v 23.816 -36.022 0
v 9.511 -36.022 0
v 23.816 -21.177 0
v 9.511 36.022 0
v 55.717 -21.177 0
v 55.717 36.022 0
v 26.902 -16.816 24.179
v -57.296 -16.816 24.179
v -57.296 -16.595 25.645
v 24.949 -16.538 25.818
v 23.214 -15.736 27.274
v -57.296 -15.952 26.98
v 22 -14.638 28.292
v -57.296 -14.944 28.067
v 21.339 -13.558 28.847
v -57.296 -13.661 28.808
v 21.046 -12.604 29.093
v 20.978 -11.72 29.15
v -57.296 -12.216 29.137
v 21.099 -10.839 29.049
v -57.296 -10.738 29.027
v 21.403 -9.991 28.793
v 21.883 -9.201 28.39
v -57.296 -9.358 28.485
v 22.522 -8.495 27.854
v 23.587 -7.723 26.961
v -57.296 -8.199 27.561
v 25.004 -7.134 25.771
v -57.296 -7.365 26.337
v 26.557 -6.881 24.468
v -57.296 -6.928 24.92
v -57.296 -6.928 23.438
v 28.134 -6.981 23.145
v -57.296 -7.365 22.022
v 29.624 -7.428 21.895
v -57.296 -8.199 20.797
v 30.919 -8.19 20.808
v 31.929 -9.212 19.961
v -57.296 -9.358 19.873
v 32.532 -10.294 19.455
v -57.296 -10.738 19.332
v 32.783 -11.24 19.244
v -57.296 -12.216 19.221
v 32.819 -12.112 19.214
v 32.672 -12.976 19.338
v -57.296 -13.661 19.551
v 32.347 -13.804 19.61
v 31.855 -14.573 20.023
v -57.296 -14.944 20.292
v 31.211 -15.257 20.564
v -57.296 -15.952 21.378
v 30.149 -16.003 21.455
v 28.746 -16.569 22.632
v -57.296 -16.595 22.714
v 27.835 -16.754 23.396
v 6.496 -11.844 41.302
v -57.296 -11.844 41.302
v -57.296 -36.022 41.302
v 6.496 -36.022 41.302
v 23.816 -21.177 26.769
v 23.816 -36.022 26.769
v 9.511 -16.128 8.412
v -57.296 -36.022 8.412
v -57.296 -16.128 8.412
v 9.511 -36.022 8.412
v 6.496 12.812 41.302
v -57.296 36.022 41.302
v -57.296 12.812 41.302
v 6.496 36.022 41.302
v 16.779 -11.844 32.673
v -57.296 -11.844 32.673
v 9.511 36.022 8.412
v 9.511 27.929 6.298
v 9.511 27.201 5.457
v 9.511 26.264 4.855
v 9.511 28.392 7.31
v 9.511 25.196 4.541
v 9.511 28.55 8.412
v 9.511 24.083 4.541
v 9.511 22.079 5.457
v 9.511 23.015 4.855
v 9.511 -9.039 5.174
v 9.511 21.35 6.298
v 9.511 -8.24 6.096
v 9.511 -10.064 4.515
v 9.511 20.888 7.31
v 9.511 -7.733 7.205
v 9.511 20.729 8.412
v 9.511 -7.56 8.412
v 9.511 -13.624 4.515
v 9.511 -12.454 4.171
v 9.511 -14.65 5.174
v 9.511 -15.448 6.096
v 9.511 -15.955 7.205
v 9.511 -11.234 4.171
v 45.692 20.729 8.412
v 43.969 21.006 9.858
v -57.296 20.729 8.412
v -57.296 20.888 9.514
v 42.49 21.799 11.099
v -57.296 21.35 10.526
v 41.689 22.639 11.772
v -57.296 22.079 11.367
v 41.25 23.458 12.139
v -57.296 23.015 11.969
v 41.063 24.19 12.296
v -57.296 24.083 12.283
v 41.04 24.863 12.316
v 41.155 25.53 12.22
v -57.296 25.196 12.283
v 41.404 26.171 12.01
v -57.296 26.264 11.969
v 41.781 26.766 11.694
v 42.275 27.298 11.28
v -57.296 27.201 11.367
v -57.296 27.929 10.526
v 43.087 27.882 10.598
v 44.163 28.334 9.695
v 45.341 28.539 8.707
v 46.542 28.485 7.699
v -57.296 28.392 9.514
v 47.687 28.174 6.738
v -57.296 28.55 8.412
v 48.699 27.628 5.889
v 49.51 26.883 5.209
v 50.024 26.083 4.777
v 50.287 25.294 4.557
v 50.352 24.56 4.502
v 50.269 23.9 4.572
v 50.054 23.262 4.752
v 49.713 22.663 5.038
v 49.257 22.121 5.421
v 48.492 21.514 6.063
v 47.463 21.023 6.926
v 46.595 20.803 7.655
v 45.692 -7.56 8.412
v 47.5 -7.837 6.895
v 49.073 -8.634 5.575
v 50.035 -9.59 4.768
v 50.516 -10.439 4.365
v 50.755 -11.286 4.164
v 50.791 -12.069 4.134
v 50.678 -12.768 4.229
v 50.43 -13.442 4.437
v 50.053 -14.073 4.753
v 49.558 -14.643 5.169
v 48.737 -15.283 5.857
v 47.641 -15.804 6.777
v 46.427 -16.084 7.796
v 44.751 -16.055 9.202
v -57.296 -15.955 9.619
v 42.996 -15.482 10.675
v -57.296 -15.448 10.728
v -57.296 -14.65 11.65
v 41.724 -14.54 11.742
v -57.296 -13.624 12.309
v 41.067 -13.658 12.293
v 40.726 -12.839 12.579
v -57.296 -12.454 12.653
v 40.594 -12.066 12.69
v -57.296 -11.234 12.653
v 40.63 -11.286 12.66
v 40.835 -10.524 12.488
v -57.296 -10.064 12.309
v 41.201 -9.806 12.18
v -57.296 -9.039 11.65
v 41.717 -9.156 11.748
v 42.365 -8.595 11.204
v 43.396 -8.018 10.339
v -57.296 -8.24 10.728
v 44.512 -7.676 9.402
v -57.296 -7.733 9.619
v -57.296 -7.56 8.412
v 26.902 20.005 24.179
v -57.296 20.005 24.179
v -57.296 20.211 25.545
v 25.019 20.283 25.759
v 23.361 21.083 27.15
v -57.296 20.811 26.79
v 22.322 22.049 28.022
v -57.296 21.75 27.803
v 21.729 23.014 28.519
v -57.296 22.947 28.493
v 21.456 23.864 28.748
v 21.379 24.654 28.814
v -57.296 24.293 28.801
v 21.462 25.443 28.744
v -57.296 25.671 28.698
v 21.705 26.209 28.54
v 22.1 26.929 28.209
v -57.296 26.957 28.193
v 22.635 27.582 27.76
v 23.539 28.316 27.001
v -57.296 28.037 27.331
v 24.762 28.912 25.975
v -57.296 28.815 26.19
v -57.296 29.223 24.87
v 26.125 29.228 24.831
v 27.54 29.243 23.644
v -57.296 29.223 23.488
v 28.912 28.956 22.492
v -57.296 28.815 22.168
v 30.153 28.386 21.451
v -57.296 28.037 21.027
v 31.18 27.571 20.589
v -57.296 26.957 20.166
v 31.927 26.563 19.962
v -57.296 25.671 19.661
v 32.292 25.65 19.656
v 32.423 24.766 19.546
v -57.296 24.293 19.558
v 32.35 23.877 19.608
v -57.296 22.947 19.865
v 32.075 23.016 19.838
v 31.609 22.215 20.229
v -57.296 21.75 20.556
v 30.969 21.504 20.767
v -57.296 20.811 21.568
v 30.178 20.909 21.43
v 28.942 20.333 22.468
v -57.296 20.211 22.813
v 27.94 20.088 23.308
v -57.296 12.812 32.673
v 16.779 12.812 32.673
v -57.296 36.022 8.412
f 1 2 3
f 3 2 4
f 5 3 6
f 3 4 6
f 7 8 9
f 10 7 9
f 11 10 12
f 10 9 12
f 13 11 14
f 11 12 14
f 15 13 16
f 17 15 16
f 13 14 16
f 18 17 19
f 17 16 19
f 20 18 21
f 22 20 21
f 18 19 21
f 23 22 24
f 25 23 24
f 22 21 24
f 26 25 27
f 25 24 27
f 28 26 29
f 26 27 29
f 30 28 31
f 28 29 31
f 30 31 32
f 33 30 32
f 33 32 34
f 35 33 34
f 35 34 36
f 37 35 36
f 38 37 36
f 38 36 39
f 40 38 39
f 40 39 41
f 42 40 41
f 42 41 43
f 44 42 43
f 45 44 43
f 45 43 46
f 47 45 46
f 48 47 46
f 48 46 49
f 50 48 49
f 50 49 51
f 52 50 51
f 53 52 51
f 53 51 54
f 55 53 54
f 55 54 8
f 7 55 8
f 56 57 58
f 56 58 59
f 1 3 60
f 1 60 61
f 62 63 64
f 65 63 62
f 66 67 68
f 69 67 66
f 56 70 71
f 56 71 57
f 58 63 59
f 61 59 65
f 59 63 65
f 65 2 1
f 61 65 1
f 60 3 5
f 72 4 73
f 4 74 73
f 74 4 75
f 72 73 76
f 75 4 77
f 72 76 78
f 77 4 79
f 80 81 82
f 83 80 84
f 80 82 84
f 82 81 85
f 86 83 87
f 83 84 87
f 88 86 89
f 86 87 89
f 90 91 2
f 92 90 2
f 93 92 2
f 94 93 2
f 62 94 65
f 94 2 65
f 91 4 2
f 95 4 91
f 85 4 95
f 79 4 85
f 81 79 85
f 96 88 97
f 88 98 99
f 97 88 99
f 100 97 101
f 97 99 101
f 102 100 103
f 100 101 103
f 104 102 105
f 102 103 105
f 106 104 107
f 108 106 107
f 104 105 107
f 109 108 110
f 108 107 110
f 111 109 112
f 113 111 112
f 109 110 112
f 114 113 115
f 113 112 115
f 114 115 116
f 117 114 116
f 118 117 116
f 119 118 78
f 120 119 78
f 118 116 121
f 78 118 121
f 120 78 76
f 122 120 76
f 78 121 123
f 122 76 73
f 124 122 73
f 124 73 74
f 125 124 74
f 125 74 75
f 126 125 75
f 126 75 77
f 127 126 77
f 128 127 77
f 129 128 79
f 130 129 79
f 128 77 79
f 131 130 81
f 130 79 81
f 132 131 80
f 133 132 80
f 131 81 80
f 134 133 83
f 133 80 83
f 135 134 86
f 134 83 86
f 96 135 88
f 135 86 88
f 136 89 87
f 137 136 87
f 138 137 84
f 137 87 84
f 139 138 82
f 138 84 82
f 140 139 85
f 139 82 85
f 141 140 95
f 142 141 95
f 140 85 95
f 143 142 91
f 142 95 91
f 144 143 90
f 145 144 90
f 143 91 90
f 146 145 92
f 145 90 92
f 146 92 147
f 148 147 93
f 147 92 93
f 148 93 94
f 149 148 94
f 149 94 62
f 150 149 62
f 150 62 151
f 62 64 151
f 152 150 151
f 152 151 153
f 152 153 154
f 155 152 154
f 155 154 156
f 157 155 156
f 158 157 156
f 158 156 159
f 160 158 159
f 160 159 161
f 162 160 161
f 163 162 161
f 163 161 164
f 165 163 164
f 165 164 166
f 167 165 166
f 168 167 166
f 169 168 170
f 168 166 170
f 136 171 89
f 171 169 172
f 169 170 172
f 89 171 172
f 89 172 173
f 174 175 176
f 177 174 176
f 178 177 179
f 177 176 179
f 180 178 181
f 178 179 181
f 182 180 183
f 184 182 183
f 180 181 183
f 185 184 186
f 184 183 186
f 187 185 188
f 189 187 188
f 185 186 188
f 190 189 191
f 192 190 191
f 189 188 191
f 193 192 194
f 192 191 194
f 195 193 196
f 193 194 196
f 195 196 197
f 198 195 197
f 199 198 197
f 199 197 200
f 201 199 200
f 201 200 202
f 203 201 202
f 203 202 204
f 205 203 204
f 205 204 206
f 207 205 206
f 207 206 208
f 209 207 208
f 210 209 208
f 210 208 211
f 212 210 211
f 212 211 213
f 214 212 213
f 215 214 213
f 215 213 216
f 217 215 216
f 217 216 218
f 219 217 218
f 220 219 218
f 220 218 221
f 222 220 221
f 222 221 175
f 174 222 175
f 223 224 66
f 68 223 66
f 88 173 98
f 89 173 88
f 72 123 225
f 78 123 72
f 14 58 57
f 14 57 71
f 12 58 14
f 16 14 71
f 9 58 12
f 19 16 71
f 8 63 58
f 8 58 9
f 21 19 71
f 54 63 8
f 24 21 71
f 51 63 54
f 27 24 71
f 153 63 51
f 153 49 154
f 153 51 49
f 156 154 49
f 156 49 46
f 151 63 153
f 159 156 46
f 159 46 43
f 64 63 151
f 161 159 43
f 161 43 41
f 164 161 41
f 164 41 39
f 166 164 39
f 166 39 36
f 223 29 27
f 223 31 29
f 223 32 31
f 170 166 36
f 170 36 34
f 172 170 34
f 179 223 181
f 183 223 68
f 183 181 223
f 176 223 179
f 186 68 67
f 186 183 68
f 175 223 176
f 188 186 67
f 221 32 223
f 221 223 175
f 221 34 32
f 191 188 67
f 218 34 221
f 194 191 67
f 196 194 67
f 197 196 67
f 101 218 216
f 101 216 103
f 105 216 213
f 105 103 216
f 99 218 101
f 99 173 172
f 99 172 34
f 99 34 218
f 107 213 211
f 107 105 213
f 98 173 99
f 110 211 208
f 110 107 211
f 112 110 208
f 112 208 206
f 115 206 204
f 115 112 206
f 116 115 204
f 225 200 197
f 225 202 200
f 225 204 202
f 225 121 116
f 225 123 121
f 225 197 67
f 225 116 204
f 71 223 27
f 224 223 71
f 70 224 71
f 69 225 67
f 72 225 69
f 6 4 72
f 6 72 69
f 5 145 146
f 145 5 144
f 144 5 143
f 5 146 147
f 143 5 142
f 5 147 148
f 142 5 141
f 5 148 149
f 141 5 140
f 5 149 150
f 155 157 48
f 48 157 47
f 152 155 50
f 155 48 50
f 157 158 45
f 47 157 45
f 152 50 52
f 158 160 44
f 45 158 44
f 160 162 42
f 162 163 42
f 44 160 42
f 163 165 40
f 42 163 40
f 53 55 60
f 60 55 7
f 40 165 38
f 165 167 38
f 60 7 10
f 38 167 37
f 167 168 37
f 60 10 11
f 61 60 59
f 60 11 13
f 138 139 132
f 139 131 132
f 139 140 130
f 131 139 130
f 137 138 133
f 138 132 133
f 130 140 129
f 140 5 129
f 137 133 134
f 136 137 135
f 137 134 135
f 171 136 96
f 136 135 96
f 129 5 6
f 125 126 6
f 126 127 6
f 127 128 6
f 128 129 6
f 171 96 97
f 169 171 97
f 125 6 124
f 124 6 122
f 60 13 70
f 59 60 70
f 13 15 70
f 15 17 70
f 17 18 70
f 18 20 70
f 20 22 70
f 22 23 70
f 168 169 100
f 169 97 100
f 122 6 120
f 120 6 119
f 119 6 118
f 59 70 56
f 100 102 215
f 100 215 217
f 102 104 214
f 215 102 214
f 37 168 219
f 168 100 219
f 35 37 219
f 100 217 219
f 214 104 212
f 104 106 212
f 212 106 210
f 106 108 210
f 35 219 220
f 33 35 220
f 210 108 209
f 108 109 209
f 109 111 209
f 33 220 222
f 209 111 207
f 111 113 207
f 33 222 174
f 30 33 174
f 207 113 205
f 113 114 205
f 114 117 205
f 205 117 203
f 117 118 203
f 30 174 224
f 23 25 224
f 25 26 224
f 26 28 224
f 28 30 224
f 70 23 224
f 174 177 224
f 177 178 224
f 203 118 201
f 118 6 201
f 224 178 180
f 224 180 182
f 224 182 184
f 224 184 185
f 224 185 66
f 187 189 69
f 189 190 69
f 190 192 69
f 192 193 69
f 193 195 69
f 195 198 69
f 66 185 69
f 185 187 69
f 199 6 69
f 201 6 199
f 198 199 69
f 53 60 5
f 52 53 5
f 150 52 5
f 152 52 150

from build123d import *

# Parameters (mm, degrees)
F0_W        = 114.5921349525
F0_H        = 72.0440149307
F1_DEPTH    = 41.3016155362
F2_W        = 66.8072551489
F2_H        = 8.4119299427
F6_DEPTH    = 72.0450149307
F7_T1_DEPTH = 333.9084750306
F3_W        = 31.901553337
F3_H        = 14.8452445865
F4_DEPTH    = 41.3026155362
F5_W        = 24.6558189392
F5_H        = 8.6286962032
F8_DEPTH    = 113.0144836478
F9_R        = 4.6345272192
F9_R_2      = 4.97207371
F10_DEPTH   = 113.0144836478


# Not quite as in the source:
# - a fillet or chamfer that OpenCascade refuses, or shapes differently, is made with other operations: its cross-section is extruded or revolved along the edge and cut away or added


with BuildPart() as f1:
    # F0 (on Top) → F1 (new body)
    with BuildSketch(Plane.XY):
        Rectangle(F0_W, F0_H)
    extrude(amount=F1_DEPTH)

    # F2 (on face) → F6 (cut, through all)
    with BuildSketch(Plane.XZ.offset(36.0220074654)):
        with Locations((-23.8924399018, 4.2059649713)):
            Rectangle(F2_W, F2_H)
    extrude(amount=-F6_DEPTH, mode=Mode.SUBTRACT)

    # F7: chamfer of 50.8 x 42.6262612638 on 1 edges, made by hand

    # F7_s2 → F7_t1 (cut)
    with BuildSketch(Plane.XZ.offset(-166.9542375153)):
        Polygon((57.2960674763, -1.3246457276), (6.4960674763, 41.3016155362), (57.2960674763, 41.3016155362), align=None)
    extrude(amount=F7_T1_DEPTH, mode=Mode.SUBTRACT)

    # F3 (on face) → F4 (cut, through all)
    with BuildSketch(Plane(origin=(0, 0, 0), x_dir=(1, 0, 0), z_dir=(0, 0, -1))):
        with Locations((39.766639503, 28.5993851721)):
            Rectangle(F3_W, F3_H)
    extrude(amount=-F4_DEPTH, mode=Mode.SUBTRACT)

    # F5 (on face) → F8 (cut, through all)
    with BuildSketch(Plane(origin=(-57.2960674763, 0, 0), x_dir=(0, -1, 0), z_dir=(-1, 0, 0))):
        with Locations((-0.4837103188, 36.9872674346)):
            Rectangle(F5_W, F5_H)
    extrude(amount=-F8_DEPTH, mode=Mode.SUBTRACT)

    # F9 (on face) → F10 (cut, through all)
    with BuildSketch(Plane(origin=(-57.2960674763, 0, 0), x_dir=(0, -1, 0), z_dir=(-1, 0, 0))):
        with Locations((-24.6397461742, 24.1792052984)):
            Circle(F9_R)
        with Locations((11.8441991508, 24.1792052984)):
            Circle(F9_R_2)
        with BuildLine():
            ThreePointArc((16.128482923, 8.4119299427), (11.8441991508, 12.6962137149), (7.5599153786, 8.4119299427))
            Line((7.5599153786, 8.4119299427), (16.128482923, 8.4119299427))
        make_face()
        with BuildLine():
            ThreePointArc((-28.5501872317, 8.4119299427), (-24.6397461742, 4.5014888852), (-20.7293051168, 8.4119299427))
            Line((-20.7293051168, 8.4119299427), (-28.5501872317, 8.4119299427))
        make_face()
        with BuildLine():
            Line((-28.5501872317, 8.4119299427), (-20.7293051168, 8.4119299427))
            ThreePointArc((-20.7293051168, 8.4119299427), (-24.6397461742, 12.3223710001), (-28.5501872317, 8.4119299427))
        make_face()
        with BuildLine():
            Line((16.128482923, 8.4119299427), (7.5599153786, 8.4119299427))
            ThreePointArc((7.5599153786, 8.4119299427), (11.8441991508, 4.1276461705), (16.128482923, 8.4119299427))
        make_face()
    extrude(amount=-F10_DEPTH, mode=Mode.SUBTRACT)


solid = f1.part
